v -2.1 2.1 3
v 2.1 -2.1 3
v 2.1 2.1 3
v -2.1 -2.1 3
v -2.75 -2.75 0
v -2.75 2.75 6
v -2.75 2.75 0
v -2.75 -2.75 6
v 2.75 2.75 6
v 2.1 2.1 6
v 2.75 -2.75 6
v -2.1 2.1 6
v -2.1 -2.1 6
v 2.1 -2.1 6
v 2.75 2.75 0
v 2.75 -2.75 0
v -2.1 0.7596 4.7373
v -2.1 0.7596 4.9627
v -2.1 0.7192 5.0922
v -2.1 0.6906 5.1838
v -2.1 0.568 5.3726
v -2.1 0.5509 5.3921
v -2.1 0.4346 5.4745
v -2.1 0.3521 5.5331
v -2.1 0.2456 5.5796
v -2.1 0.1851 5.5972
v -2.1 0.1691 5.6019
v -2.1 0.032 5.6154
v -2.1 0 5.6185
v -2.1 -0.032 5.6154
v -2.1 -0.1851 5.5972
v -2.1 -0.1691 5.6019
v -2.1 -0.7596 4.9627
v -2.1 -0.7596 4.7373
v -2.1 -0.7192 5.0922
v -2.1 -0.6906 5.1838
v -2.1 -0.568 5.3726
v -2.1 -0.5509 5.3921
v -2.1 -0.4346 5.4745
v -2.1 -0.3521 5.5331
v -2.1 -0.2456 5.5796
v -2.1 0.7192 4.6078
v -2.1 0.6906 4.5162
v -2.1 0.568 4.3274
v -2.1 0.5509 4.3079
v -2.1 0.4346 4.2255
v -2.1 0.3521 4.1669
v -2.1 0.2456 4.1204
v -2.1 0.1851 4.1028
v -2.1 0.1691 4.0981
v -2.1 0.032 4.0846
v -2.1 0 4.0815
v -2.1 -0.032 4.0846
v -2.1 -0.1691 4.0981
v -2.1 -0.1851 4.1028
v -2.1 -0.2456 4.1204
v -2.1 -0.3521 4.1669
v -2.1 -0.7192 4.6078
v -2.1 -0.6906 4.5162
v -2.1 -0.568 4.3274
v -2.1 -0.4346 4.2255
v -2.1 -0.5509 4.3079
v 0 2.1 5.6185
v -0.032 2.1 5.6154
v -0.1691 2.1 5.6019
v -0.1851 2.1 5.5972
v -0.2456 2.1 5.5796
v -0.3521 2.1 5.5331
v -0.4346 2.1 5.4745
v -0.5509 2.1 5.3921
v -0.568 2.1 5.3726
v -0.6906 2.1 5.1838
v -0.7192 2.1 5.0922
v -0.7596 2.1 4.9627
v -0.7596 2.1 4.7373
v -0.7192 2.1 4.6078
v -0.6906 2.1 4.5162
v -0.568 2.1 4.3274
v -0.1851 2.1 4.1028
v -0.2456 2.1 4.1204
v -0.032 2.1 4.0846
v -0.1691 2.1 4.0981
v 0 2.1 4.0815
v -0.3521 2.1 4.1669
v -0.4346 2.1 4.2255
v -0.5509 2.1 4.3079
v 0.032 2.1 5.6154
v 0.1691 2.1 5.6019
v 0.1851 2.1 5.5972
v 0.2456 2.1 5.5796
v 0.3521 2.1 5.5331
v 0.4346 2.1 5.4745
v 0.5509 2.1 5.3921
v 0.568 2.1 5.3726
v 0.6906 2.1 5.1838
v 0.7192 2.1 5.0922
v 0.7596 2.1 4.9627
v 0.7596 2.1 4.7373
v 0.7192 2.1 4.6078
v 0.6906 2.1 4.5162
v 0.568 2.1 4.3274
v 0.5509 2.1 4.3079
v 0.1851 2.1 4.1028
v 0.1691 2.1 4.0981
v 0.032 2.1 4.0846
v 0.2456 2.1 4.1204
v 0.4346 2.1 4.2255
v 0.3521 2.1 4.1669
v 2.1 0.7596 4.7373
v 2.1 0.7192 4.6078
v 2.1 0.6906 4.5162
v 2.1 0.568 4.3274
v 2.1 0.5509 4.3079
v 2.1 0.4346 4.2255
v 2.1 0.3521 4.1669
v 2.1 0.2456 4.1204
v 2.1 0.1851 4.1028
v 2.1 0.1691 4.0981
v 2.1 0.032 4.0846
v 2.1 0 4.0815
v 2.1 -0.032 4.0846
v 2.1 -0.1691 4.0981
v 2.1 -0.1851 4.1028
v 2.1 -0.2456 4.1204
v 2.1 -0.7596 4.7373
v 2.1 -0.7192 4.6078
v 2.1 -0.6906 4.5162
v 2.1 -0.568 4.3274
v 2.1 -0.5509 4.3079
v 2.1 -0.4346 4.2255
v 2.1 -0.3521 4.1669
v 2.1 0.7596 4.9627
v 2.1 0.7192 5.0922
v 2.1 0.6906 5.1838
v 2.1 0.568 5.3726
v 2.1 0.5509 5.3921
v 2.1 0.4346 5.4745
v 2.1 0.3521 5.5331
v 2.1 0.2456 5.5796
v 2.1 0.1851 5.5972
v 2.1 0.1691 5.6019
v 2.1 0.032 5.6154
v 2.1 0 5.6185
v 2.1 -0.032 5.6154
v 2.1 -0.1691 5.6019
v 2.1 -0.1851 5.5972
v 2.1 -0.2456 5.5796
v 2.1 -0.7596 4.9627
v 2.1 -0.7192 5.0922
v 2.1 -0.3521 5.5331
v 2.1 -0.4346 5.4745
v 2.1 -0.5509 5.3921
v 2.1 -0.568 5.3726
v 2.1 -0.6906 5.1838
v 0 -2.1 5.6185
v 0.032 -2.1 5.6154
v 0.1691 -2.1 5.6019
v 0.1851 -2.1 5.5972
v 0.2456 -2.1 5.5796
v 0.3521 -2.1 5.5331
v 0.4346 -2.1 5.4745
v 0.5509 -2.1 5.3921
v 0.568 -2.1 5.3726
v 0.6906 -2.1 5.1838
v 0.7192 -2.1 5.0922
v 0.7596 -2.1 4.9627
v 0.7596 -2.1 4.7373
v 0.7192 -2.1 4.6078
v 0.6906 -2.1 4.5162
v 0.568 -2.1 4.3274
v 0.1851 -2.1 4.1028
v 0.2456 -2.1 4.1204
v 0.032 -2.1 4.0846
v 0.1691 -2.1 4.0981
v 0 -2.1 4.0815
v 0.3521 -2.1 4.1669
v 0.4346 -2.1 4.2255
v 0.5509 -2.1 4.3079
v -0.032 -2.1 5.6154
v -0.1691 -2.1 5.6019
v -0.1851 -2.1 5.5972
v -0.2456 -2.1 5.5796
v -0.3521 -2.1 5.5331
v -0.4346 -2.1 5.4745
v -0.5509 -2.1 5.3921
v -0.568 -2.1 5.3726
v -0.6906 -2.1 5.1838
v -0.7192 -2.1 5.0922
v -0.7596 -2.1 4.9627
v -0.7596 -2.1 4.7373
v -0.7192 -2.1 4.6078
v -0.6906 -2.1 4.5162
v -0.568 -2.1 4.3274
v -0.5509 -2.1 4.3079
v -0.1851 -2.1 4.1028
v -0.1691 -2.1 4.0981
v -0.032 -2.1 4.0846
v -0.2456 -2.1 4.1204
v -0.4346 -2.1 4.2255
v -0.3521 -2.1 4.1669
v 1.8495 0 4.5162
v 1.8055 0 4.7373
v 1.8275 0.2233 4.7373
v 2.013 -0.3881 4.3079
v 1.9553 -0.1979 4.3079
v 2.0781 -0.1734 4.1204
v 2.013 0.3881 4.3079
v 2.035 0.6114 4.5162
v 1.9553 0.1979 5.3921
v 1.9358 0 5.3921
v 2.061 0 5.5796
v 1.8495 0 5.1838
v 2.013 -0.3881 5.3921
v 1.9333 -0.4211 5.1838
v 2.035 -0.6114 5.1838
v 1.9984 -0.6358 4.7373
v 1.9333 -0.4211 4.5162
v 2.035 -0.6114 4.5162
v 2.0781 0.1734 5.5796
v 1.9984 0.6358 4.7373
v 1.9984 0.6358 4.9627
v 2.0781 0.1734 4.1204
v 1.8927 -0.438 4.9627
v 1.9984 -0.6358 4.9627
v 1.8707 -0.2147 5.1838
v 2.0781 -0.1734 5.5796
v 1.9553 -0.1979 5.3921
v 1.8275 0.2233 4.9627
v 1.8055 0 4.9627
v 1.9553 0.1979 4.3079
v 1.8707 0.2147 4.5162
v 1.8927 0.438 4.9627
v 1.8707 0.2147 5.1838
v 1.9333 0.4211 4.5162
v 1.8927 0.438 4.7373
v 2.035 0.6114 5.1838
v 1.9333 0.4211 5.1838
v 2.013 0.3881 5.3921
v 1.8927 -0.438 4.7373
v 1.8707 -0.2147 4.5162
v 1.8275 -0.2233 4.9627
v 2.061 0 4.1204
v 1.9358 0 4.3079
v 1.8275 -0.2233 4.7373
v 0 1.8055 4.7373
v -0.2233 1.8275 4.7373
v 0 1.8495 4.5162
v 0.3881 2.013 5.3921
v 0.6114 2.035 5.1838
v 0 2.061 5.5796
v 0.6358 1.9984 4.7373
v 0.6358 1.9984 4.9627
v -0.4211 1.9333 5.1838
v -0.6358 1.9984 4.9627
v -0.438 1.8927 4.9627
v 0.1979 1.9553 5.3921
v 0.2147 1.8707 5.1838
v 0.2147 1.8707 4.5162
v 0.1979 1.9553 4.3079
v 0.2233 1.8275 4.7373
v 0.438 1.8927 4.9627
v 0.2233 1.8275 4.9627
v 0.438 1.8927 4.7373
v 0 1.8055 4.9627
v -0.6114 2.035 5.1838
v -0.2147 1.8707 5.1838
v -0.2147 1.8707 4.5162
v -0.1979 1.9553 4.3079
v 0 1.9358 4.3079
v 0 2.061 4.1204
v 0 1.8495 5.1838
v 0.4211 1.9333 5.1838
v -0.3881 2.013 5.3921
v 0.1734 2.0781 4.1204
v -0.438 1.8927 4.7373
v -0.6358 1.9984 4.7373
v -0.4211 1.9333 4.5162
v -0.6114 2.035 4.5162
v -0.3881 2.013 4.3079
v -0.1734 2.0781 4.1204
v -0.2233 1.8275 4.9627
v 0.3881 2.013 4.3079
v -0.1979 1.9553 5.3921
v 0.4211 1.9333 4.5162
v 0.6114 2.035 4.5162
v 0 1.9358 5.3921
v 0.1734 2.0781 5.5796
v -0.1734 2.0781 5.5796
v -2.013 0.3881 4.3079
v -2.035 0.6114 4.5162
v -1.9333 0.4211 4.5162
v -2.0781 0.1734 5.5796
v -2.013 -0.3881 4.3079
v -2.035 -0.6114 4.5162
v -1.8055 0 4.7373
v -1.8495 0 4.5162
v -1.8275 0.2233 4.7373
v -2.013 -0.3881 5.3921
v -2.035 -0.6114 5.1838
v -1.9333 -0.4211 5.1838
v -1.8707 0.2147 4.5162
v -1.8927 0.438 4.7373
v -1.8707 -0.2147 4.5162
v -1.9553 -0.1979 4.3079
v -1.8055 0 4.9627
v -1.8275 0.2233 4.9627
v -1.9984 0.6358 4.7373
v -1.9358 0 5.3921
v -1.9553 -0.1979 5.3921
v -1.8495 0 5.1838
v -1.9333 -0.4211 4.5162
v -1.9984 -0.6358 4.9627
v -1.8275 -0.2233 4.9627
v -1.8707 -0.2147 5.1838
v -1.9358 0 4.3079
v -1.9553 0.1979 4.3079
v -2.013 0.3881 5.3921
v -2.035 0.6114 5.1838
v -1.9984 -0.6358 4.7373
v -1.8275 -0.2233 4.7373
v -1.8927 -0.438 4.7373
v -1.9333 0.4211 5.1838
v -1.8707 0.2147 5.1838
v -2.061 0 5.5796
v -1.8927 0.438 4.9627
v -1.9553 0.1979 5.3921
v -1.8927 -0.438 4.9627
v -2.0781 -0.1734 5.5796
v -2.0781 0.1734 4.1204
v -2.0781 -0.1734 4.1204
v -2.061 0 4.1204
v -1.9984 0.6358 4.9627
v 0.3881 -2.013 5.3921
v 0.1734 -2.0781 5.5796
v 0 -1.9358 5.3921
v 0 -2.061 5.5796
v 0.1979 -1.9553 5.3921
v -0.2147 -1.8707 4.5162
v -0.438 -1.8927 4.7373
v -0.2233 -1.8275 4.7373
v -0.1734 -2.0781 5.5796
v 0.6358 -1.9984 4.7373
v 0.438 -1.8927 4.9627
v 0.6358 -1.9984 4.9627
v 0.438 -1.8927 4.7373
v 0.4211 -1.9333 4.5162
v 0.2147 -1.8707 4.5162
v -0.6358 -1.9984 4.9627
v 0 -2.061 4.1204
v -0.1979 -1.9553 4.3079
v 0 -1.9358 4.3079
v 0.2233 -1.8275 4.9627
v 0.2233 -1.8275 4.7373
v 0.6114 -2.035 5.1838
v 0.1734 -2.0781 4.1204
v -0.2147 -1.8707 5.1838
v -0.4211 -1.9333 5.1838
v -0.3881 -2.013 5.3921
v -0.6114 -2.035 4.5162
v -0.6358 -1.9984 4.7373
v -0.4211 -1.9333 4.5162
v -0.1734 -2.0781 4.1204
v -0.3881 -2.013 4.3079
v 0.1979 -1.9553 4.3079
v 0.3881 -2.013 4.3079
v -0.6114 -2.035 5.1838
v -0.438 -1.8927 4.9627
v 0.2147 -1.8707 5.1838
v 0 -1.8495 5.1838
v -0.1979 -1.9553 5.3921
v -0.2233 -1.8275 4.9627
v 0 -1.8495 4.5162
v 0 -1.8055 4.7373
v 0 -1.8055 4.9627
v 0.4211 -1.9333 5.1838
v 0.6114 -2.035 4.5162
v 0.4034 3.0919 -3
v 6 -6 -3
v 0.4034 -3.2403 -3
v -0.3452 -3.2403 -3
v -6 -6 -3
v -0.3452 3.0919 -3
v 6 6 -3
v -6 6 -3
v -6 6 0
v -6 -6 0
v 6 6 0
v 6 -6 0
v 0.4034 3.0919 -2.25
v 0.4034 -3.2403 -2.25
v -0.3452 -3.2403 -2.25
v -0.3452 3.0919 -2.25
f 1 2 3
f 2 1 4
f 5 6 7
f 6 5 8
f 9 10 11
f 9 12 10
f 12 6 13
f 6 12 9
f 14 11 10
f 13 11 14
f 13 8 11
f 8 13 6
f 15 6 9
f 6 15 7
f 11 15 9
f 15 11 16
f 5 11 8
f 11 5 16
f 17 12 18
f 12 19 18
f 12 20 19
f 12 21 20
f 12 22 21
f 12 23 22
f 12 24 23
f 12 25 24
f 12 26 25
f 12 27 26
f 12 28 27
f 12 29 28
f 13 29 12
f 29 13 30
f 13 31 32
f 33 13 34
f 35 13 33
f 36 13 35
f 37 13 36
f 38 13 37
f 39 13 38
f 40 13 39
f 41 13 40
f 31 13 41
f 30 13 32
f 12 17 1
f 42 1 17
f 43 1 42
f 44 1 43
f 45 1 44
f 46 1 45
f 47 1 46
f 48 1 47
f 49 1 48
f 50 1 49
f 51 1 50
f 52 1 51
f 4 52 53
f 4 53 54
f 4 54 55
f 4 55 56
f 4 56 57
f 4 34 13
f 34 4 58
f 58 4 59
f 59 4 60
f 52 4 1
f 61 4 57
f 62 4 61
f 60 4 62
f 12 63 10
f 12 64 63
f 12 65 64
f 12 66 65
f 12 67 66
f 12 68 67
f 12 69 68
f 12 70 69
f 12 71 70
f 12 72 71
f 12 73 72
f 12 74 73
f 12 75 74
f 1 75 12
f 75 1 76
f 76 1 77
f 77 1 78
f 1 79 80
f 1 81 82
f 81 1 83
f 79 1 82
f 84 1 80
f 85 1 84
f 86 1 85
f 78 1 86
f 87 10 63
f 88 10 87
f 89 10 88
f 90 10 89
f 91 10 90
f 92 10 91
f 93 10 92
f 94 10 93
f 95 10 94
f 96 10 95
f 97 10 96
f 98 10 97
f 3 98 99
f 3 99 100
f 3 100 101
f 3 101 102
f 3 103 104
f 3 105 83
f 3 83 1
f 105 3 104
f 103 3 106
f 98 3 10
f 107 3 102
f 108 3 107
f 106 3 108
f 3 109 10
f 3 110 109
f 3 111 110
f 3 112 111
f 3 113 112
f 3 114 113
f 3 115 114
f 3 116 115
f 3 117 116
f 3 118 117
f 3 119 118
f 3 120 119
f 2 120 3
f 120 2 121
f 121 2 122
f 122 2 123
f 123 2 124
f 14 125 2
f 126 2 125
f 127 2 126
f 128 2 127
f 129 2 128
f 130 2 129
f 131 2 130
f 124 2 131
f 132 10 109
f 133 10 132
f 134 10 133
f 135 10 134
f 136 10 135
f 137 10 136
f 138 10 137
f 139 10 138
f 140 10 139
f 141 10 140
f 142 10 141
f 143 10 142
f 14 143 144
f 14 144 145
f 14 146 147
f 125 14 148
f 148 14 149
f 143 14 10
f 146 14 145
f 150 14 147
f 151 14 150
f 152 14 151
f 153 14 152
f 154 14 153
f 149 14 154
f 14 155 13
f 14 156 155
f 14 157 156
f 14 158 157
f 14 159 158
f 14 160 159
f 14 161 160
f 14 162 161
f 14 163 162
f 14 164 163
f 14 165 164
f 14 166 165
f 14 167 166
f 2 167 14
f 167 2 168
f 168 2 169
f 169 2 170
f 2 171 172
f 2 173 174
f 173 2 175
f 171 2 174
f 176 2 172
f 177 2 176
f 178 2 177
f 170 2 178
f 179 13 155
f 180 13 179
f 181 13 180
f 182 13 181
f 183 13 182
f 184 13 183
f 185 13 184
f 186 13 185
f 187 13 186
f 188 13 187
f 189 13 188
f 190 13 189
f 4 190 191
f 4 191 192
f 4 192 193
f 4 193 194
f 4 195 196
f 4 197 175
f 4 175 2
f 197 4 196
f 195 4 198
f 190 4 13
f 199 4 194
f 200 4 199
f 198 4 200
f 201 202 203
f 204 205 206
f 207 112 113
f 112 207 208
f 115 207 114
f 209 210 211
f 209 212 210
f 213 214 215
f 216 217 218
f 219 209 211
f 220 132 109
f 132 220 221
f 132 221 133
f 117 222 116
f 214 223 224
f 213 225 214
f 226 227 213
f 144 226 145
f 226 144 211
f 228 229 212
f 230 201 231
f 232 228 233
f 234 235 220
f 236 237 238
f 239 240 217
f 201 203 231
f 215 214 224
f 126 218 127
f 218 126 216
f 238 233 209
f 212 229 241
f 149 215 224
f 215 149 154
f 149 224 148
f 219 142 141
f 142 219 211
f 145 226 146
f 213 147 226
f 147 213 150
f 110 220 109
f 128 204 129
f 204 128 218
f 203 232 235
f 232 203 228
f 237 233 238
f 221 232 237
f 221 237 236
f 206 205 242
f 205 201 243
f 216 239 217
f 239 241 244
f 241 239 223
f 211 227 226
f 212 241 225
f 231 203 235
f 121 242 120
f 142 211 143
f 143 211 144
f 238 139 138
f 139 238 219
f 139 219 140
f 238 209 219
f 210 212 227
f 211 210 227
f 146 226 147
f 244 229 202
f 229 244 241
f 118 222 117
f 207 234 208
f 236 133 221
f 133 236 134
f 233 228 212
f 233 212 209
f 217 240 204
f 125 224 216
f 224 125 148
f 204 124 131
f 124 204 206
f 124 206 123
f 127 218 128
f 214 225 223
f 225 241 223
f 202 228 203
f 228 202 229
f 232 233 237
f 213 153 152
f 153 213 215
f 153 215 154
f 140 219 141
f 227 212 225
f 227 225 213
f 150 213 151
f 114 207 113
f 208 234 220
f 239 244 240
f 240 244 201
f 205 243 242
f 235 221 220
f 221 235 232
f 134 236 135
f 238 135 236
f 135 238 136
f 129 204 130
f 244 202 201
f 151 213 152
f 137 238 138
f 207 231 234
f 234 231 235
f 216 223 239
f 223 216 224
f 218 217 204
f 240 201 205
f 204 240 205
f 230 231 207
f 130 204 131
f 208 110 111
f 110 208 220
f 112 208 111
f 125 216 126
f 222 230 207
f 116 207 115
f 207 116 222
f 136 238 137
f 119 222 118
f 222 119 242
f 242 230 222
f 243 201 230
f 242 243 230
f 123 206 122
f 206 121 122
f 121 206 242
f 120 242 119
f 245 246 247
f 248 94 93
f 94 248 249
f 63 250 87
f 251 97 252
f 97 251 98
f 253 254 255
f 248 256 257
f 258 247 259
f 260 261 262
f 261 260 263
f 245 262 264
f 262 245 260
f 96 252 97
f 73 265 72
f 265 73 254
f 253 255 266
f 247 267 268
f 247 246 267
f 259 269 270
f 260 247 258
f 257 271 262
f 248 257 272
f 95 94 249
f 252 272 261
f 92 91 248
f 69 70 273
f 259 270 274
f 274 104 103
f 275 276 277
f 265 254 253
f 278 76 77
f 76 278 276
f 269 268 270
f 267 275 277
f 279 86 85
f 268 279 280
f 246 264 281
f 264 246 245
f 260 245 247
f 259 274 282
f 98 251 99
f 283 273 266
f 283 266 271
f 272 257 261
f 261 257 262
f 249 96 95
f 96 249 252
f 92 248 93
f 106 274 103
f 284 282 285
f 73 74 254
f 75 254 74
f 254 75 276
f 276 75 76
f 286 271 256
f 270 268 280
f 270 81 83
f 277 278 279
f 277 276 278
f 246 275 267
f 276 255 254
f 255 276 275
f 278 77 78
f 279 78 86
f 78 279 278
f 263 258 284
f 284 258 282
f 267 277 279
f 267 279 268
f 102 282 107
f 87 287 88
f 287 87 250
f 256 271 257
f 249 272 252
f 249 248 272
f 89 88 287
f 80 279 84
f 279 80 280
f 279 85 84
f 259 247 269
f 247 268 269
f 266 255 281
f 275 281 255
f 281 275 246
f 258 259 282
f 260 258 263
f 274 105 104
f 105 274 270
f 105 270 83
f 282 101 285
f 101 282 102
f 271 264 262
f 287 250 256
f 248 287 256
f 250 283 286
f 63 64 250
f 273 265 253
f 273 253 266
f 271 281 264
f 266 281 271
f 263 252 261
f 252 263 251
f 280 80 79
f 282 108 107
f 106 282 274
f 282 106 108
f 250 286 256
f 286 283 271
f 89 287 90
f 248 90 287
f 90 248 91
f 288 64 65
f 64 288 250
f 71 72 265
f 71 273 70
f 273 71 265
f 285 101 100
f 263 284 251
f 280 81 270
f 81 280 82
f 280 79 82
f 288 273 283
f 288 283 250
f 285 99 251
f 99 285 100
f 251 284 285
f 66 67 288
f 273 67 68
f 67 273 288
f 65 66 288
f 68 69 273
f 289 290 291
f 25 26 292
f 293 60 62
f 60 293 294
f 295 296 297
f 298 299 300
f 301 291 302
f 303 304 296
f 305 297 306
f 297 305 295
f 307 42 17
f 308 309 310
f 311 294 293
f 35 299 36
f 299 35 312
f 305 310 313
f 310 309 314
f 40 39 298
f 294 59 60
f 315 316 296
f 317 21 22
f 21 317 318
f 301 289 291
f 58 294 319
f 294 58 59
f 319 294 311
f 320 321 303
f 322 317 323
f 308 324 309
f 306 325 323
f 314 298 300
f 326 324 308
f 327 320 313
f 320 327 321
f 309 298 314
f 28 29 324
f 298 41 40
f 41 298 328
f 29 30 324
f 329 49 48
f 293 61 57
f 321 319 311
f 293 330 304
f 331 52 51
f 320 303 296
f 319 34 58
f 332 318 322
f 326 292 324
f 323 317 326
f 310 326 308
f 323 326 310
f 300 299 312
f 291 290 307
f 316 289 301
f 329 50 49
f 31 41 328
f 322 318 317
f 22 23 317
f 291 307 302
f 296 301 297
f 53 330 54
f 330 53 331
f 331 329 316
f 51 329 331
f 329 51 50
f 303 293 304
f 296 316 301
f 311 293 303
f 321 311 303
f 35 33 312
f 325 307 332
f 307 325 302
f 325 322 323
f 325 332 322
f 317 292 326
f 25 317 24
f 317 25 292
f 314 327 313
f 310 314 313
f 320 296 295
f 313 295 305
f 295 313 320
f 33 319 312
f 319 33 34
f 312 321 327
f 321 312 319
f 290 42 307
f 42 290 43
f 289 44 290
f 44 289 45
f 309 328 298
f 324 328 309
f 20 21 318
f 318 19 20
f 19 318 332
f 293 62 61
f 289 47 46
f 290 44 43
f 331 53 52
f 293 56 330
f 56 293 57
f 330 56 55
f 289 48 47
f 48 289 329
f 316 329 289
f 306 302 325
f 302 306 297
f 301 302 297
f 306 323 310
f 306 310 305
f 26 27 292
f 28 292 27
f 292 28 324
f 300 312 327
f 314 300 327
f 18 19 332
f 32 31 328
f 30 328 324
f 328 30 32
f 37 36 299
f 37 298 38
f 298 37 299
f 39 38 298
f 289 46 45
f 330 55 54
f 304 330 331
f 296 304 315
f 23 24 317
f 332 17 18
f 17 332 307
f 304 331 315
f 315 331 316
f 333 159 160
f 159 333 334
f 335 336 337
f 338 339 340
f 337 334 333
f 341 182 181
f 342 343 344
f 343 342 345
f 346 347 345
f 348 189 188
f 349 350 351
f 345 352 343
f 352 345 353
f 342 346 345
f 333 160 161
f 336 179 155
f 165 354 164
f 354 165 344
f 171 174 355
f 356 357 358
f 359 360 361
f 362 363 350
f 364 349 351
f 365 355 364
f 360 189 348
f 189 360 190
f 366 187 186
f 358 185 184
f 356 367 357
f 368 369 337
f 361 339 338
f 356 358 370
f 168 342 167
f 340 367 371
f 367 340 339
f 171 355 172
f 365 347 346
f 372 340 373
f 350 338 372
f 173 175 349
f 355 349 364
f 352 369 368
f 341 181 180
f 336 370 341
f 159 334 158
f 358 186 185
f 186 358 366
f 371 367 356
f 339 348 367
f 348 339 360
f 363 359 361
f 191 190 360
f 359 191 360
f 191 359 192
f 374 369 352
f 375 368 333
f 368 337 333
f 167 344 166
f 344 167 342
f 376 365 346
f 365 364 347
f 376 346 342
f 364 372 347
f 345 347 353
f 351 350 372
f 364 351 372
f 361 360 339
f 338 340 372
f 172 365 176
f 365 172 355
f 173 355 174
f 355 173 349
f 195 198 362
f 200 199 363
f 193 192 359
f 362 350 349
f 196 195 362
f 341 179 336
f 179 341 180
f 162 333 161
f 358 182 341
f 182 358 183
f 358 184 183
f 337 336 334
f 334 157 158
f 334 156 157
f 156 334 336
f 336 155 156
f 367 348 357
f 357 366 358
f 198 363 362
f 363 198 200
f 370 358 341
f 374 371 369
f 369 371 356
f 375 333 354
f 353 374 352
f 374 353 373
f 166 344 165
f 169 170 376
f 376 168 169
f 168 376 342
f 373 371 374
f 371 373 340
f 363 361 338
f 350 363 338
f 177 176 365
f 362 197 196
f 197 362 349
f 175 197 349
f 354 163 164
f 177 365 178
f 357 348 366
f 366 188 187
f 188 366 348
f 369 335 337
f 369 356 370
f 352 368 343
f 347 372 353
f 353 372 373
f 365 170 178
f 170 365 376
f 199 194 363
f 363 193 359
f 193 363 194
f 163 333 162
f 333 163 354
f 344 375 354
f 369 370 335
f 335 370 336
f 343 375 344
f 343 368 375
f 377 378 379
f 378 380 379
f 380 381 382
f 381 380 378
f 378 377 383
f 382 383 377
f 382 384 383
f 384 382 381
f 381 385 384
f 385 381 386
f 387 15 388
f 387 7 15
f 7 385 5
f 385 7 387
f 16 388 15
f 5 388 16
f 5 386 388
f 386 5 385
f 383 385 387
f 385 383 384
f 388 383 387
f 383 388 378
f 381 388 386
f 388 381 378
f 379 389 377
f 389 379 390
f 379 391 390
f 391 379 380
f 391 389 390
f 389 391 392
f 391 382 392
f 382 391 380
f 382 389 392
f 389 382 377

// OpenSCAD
$fn = 32;

Label = "l";
TextSize = 6;

module Clip(StemOuter, StemInter, ClipHeight) {
    union() {
        difference() {
            linear_extrude(ClipHeight)
                square(StemOuter, center=true);
            linear_extrude(ClipHeight)
                square(StemInter, center=true);
        }
        
        intersection() {
            union() {
                ClipDepth = 0.3;
                IndentHeight = 1;
                BallRadius = (IndentHeight ^ 2) + (ClipDepth / 2);
                BallOffset = (StemInter / 2) + (BallRadius - ClipDepth);
                BallHeight = ClipHeight - BallRadius;
                translate([BallOffset, 0, BallHeight])
                    sphere(BallRadius);
                translate([0, BallOffset, BallHeight])
                    sphere(BallRadius);
                translate([-BallOffset, 0, BallHeight])
                    sphere(BallRadius);
                translate([0, -BallOffset, BallHeight])
                    sphere(BallRadius);
            }
            
            linear_extrude(ClipHeight)
                square(StemInter, center=true);
        }
    }
}

module ButtonBase(ButtonWidth, ButtonThickness, StemLength) {
    union() {
        translate([0, 0, -ButtonThickness])
            linear_extrude(ButtonThickness)
                square(ButtonWidth, center=true);

        StemOuter = 5.5;
        StemInter = 4.2;
        ClipHeight = 3;
        linear_extrude(StemLength - ClipHeight)
            square(StemOuter, center=true);
        translate([0, 0, StemLength - ClipHeight])
            Clip(StemOuter, StemInter, ClipHeight);
    }
}

module Button(Label, TextSize) {
    ButtonWidth = 12;
    ButtonThickness = 3;
    StemLength = 6;

    difference() {
        ButtonBase(ButtonWidth, ButtonThickness, StemLength);

        translate([0, 0, -ButtonThickness])
            linear_extrude(ButtonThickness/4)
                mirror([0, 1, 0])
                    text(Label, size=TextSize, halign="center", valign="center", font="Wingdings");
    }
}
Button(Label, TextSize);
